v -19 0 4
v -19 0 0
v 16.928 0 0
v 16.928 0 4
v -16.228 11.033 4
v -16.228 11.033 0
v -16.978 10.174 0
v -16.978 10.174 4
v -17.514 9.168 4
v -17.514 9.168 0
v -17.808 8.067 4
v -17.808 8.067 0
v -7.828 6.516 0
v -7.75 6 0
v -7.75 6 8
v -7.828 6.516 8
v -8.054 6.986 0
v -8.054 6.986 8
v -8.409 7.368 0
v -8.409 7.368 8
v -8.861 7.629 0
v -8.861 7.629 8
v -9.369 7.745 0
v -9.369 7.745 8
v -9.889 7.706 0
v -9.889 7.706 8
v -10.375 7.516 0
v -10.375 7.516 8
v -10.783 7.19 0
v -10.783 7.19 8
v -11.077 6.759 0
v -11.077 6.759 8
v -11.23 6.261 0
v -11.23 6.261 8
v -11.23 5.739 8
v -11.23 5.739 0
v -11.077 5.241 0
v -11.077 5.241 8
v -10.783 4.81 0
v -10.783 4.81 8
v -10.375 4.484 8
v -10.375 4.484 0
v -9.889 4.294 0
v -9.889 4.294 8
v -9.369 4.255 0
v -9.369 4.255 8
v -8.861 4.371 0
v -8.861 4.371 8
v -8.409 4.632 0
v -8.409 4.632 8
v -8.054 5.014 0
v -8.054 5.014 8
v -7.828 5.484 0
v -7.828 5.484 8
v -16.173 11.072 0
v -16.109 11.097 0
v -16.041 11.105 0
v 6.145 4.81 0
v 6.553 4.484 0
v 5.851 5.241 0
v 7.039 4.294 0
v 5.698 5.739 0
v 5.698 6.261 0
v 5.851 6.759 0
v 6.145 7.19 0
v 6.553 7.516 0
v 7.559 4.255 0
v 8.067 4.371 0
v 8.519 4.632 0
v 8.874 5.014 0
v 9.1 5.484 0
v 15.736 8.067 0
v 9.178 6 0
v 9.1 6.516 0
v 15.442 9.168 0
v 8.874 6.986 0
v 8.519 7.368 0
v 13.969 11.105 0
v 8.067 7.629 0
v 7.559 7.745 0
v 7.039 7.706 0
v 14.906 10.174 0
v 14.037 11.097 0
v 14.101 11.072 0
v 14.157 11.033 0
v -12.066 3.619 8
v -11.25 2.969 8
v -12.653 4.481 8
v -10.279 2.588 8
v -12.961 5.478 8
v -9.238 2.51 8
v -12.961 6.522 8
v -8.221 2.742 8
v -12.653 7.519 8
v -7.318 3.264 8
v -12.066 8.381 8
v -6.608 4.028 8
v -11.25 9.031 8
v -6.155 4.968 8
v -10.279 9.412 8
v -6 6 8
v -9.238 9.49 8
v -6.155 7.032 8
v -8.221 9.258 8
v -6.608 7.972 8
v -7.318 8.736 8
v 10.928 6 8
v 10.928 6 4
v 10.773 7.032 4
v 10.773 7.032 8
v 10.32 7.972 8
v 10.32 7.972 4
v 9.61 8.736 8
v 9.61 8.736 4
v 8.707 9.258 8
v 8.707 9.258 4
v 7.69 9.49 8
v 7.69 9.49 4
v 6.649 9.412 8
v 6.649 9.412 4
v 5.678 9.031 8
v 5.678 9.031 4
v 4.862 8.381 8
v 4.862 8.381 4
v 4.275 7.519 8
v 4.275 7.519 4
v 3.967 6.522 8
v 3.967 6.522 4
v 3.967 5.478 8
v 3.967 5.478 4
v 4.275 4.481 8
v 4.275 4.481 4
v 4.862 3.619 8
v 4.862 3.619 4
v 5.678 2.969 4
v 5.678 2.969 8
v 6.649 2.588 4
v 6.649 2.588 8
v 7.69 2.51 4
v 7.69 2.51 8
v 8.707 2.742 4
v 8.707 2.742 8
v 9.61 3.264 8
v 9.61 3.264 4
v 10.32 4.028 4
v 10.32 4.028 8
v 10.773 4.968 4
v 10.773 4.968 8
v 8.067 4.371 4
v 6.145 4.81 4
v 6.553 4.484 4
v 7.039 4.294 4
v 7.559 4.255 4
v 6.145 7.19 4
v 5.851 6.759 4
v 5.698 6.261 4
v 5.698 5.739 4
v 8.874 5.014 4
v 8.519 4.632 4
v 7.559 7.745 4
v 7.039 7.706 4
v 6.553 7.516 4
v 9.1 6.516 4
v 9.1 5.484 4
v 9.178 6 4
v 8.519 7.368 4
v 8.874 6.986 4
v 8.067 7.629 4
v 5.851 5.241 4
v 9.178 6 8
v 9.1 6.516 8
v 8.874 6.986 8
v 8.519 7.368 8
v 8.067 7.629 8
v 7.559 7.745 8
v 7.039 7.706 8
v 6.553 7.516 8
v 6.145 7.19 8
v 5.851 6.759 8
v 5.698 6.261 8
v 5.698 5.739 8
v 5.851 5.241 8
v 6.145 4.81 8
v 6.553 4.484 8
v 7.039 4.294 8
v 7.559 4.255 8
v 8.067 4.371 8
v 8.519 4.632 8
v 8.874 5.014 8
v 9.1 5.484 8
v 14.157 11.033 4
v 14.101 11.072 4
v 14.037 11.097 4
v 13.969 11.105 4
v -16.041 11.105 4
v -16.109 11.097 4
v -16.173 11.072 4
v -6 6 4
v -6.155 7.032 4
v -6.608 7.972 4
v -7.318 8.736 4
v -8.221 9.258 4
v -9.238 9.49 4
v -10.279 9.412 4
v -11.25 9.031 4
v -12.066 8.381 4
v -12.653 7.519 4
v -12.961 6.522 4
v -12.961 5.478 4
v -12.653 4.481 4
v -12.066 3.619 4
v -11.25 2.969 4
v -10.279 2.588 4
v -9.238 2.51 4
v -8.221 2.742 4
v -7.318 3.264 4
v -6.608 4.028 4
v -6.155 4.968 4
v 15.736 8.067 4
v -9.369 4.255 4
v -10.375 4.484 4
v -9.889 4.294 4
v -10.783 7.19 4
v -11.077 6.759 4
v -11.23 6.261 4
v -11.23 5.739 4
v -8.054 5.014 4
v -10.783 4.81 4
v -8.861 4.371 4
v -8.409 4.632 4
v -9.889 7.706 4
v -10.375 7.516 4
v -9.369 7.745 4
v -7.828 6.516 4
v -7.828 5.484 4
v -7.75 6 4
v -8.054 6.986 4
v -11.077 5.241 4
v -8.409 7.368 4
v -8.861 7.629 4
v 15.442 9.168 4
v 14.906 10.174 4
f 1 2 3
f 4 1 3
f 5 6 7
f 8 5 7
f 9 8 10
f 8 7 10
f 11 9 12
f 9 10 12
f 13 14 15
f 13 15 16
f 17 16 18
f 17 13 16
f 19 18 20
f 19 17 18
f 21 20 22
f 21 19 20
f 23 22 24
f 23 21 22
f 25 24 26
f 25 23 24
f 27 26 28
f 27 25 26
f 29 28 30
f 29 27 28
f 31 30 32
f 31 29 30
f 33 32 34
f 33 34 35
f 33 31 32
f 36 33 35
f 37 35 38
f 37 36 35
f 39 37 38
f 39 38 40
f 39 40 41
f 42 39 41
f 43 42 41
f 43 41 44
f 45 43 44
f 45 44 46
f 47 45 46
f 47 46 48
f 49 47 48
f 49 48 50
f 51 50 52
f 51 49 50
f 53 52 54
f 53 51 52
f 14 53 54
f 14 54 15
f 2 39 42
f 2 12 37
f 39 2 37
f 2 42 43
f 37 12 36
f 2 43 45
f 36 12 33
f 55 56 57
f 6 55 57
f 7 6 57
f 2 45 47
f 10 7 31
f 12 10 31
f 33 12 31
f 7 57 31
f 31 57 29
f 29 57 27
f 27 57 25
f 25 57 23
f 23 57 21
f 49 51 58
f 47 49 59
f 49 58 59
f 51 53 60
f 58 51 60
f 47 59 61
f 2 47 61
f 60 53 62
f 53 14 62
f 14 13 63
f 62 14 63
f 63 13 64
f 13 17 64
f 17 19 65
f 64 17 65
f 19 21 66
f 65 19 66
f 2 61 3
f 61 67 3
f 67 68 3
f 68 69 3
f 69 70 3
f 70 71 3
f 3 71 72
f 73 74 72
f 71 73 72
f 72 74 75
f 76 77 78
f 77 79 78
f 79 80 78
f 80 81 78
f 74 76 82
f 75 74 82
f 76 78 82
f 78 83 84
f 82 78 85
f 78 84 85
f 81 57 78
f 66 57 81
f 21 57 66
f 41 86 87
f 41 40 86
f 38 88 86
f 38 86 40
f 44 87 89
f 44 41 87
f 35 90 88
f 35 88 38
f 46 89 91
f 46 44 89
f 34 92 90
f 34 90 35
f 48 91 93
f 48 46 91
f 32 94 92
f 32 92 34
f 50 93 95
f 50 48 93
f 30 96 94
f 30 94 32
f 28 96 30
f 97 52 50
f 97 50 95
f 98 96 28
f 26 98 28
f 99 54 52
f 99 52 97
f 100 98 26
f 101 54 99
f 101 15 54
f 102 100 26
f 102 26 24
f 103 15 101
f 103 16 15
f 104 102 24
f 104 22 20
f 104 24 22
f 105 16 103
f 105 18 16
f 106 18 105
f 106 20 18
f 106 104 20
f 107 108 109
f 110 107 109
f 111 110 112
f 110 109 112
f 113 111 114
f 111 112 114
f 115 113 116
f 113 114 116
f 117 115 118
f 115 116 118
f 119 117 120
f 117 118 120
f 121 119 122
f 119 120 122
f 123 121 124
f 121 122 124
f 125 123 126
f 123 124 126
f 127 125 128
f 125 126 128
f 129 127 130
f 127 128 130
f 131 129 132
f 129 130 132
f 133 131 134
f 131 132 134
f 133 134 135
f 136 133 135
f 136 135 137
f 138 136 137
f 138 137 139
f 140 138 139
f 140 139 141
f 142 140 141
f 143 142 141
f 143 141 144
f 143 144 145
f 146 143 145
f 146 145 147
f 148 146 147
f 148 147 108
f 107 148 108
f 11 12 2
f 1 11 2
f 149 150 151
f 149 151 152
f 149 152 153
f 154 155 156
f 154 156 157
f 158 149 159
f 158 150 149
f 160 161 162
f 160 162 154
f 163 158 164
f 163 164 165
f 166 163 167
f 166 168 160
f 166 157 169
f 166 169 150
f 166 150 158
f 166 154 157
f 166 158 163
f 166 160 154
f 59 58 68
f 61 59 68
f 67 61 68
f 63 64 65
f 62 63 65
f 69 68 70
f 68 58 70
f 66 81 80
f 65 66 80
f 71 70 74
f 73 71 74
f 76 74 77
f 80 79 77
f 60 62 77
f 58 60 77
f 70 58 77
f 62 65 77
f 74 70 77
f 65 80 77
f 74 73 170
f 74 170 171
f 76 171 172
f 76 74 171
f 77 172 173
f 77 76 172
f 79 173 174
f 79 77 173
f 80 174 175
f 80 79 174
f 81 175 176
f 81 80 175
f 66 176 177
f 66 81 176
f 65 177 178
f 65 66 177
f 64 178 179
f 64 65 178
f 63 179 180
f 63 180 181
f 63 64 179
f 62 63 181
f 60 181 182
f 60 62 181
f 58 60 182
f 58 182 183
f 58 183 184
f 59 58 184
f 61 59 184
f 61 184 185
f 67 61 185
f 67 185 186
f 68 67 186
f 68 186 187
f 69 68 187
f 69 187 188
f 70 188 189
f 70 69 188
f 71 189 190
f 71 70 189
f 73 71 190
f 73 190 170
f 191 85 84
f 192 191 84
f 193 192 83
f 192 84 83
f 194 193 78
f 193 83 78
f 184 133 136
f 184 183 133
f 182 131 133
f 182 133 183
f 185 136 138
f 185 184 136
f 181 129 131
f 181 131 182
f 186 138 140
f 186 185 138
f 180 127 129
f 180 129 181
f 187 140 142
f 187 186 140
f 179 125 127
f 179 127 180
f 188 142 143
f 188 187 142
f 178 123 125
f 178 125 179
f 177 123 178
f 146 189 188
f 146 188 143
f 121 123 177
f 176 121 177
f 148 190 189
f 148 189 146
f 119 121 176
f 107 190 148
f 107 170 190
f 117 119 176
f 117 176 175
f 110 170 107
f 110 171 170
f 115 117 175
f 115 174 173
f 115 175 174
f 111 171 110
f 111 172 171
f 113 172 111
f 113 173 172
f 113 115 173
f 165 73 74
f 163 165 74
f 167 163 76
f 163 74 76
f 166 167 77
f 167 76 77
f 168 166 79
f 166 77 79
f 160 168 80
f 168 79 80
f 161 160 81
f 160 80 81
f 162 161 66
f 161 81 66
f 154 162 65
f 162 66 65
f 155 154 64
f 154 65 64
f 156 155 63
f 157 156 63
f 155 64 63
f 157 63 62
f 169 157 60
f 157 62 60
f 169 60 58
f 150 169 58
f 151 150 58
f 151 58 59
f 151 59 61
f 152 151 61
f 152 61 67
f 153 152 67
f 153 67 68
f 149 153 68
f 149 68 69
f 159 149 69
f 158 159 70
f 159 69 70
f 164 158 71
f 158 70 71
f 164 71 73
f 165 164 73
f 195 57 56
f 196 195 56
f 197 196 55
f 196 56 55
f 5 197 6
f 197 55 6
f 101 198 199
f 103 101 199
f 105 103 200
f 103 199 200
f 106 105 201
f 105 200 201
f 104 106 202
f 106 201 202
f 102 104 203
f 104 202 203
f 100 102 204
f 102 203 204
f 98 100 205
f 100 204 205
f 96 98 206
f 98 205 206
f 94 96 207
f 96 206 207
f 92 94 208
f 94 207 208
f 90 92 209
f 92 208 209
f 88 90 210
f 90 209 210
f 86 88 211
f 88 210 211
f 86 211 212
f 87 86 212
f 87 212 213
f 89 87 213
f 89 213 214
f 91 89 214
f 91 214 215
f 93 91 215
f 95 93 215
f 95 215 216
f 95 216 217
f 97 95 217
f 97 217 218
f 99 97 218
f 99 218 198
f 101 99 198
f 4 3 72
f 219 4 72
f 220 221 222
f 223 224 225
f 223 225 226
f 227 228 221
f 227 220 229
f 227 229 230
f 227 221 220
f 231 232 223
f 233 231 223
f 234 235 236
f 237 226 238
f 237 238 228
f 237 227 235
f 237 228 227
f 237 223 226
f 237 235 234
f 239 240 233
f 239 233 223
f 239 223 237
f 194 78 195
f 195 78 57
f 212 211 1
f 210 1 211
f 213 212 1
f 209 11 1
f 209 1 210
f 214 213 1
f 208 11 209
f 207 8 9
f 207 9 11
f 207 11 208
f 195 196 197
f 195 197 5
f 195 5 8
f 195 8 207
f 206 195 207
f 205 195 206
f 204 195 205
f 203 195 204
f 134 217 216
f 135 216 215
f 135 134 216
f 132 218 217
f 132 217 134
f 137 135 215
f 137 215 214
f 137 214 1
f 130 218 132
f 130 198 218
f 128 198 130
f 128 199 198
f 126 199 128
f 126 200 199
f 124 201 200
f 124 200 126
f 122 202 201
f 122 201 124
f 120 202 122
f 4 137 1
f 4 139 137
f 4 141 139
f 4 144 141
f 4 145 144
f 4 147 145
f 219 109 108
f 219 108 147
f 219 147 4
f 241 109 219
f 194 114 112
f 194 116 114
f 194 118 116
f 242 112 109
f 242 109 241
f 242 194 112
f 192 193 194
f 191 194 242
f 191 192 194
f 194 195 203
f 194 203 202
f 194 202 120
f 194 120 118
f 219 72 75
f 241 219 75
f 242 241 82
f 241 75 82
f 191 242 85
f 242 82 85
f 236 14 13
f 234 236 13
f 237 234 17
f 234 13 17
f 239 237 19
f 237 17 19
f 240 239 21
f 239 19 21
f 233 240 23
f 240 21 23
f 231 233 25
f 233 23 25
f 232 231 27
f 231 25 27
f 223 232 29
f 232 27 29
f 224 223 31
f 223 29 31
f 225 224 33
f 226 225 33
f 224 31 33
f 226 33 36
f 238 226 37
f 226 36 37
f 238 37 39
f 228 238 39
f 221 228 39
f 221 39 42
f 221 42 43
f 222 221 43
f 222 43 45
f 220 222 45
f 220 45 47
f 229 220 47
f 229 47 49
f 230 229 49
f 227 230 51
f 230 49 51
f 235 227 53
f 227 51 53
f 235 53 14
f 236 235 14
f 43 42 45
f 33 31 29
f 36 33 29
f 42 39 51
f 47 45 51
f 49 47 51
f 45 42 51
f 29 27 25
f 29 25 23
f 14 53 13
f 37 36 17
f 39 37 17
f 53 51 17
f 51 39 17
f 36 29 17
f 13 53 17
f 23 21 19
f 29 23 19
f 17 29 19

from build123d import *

# Parameters (mm, degrees)
F0_R     = 3.5
F1_DEPTH = 4
F0_R_2   = 1.75
F2_DEPTH = 4
F3_DEPTH = 8


# Not quite as in the source:
# - a feature names something its author has since deleted; it is built from what else it names


with BuildPart() as f1:
    # F0 (on Top) → F1 (new body)
    with BuildSketch(Plane.XY):
        with BuildLine():
            Line((-17.8081062952, 8.0668847322), (-19, 0))
            Line((-19, 0), (16.9281060712, 0))
            Line((16.9281060712, 0), (15.7362123664, 8.0668847322))
            ThreePointArc((15.7362123664, 8.0668847322), (15.2030202368, 9.6864800202), (14.1566041965, 11.0327326766))
            ThreePointArc((14.1566041965, 11.0327326766), (14.0697297328, 11.0864795446), (13.9693106268, 11.1052385806))
            Line((13.9693106268, 11.1052385806), (-16.0412045557, 11.1052385806))
            ThreePointArc((-16.0412045557, 11.1052385806), (-16.1416236616, 11.0864795446), (-16.2284981253, 11.0327326766))
            ThreePointArc((-16.2284981253, 11.0327326766), (-17.2749141656, 9.6864800202), (-17.8081062952, 8.0668847322))
        make_face()
        with Locations((-9.5, 6)):
            Circle(F0_R, mode=Mode.SUBTRACT)
        with Locations((7.4281060712, 6)):
            Circle(F0_R, mode=Mode.SUBTRACT)
    extrude(amount=F1_DEPTH)

    # F0 (on Top) → F3 (join)
    with BuildSketch(Plane.XY):
        with Locations((-9.5, 6)):
            Circle(F0_R)
        with Locations((-9.5, 6)):
            Circle(F0_R_2, mode=Mode.SUBTRACT)
        with Locations((7.4281060712, 6)):
            Circle(F0_R)
        with Locations((7.4281060712, 6)):
            Circle(F0_R_2, mode=Mode.SUBTRACT)
    extrude(amount=F3_DEPTH)


with BuildPart() as f2:
    # F0 (on Top) → F2 (new body)
    with BuildSketch(Plane.XY):
        with Locations((-9.5, 6)):
            Circle(F0_R_2)
    extrude(amount=F2_DEPTH)


with BuildPart() as f2b:
    # F0 (on Top) → F2, piece 2 (new body)
    with BuildSketch(Plane.XY):
        with Locations((7.4281060712, 6)):
            Circle(F0_R_2)
    extrude(amount=F2_DEPTH)


solid = Compound([f1.part, f2.part, f2b.part])
